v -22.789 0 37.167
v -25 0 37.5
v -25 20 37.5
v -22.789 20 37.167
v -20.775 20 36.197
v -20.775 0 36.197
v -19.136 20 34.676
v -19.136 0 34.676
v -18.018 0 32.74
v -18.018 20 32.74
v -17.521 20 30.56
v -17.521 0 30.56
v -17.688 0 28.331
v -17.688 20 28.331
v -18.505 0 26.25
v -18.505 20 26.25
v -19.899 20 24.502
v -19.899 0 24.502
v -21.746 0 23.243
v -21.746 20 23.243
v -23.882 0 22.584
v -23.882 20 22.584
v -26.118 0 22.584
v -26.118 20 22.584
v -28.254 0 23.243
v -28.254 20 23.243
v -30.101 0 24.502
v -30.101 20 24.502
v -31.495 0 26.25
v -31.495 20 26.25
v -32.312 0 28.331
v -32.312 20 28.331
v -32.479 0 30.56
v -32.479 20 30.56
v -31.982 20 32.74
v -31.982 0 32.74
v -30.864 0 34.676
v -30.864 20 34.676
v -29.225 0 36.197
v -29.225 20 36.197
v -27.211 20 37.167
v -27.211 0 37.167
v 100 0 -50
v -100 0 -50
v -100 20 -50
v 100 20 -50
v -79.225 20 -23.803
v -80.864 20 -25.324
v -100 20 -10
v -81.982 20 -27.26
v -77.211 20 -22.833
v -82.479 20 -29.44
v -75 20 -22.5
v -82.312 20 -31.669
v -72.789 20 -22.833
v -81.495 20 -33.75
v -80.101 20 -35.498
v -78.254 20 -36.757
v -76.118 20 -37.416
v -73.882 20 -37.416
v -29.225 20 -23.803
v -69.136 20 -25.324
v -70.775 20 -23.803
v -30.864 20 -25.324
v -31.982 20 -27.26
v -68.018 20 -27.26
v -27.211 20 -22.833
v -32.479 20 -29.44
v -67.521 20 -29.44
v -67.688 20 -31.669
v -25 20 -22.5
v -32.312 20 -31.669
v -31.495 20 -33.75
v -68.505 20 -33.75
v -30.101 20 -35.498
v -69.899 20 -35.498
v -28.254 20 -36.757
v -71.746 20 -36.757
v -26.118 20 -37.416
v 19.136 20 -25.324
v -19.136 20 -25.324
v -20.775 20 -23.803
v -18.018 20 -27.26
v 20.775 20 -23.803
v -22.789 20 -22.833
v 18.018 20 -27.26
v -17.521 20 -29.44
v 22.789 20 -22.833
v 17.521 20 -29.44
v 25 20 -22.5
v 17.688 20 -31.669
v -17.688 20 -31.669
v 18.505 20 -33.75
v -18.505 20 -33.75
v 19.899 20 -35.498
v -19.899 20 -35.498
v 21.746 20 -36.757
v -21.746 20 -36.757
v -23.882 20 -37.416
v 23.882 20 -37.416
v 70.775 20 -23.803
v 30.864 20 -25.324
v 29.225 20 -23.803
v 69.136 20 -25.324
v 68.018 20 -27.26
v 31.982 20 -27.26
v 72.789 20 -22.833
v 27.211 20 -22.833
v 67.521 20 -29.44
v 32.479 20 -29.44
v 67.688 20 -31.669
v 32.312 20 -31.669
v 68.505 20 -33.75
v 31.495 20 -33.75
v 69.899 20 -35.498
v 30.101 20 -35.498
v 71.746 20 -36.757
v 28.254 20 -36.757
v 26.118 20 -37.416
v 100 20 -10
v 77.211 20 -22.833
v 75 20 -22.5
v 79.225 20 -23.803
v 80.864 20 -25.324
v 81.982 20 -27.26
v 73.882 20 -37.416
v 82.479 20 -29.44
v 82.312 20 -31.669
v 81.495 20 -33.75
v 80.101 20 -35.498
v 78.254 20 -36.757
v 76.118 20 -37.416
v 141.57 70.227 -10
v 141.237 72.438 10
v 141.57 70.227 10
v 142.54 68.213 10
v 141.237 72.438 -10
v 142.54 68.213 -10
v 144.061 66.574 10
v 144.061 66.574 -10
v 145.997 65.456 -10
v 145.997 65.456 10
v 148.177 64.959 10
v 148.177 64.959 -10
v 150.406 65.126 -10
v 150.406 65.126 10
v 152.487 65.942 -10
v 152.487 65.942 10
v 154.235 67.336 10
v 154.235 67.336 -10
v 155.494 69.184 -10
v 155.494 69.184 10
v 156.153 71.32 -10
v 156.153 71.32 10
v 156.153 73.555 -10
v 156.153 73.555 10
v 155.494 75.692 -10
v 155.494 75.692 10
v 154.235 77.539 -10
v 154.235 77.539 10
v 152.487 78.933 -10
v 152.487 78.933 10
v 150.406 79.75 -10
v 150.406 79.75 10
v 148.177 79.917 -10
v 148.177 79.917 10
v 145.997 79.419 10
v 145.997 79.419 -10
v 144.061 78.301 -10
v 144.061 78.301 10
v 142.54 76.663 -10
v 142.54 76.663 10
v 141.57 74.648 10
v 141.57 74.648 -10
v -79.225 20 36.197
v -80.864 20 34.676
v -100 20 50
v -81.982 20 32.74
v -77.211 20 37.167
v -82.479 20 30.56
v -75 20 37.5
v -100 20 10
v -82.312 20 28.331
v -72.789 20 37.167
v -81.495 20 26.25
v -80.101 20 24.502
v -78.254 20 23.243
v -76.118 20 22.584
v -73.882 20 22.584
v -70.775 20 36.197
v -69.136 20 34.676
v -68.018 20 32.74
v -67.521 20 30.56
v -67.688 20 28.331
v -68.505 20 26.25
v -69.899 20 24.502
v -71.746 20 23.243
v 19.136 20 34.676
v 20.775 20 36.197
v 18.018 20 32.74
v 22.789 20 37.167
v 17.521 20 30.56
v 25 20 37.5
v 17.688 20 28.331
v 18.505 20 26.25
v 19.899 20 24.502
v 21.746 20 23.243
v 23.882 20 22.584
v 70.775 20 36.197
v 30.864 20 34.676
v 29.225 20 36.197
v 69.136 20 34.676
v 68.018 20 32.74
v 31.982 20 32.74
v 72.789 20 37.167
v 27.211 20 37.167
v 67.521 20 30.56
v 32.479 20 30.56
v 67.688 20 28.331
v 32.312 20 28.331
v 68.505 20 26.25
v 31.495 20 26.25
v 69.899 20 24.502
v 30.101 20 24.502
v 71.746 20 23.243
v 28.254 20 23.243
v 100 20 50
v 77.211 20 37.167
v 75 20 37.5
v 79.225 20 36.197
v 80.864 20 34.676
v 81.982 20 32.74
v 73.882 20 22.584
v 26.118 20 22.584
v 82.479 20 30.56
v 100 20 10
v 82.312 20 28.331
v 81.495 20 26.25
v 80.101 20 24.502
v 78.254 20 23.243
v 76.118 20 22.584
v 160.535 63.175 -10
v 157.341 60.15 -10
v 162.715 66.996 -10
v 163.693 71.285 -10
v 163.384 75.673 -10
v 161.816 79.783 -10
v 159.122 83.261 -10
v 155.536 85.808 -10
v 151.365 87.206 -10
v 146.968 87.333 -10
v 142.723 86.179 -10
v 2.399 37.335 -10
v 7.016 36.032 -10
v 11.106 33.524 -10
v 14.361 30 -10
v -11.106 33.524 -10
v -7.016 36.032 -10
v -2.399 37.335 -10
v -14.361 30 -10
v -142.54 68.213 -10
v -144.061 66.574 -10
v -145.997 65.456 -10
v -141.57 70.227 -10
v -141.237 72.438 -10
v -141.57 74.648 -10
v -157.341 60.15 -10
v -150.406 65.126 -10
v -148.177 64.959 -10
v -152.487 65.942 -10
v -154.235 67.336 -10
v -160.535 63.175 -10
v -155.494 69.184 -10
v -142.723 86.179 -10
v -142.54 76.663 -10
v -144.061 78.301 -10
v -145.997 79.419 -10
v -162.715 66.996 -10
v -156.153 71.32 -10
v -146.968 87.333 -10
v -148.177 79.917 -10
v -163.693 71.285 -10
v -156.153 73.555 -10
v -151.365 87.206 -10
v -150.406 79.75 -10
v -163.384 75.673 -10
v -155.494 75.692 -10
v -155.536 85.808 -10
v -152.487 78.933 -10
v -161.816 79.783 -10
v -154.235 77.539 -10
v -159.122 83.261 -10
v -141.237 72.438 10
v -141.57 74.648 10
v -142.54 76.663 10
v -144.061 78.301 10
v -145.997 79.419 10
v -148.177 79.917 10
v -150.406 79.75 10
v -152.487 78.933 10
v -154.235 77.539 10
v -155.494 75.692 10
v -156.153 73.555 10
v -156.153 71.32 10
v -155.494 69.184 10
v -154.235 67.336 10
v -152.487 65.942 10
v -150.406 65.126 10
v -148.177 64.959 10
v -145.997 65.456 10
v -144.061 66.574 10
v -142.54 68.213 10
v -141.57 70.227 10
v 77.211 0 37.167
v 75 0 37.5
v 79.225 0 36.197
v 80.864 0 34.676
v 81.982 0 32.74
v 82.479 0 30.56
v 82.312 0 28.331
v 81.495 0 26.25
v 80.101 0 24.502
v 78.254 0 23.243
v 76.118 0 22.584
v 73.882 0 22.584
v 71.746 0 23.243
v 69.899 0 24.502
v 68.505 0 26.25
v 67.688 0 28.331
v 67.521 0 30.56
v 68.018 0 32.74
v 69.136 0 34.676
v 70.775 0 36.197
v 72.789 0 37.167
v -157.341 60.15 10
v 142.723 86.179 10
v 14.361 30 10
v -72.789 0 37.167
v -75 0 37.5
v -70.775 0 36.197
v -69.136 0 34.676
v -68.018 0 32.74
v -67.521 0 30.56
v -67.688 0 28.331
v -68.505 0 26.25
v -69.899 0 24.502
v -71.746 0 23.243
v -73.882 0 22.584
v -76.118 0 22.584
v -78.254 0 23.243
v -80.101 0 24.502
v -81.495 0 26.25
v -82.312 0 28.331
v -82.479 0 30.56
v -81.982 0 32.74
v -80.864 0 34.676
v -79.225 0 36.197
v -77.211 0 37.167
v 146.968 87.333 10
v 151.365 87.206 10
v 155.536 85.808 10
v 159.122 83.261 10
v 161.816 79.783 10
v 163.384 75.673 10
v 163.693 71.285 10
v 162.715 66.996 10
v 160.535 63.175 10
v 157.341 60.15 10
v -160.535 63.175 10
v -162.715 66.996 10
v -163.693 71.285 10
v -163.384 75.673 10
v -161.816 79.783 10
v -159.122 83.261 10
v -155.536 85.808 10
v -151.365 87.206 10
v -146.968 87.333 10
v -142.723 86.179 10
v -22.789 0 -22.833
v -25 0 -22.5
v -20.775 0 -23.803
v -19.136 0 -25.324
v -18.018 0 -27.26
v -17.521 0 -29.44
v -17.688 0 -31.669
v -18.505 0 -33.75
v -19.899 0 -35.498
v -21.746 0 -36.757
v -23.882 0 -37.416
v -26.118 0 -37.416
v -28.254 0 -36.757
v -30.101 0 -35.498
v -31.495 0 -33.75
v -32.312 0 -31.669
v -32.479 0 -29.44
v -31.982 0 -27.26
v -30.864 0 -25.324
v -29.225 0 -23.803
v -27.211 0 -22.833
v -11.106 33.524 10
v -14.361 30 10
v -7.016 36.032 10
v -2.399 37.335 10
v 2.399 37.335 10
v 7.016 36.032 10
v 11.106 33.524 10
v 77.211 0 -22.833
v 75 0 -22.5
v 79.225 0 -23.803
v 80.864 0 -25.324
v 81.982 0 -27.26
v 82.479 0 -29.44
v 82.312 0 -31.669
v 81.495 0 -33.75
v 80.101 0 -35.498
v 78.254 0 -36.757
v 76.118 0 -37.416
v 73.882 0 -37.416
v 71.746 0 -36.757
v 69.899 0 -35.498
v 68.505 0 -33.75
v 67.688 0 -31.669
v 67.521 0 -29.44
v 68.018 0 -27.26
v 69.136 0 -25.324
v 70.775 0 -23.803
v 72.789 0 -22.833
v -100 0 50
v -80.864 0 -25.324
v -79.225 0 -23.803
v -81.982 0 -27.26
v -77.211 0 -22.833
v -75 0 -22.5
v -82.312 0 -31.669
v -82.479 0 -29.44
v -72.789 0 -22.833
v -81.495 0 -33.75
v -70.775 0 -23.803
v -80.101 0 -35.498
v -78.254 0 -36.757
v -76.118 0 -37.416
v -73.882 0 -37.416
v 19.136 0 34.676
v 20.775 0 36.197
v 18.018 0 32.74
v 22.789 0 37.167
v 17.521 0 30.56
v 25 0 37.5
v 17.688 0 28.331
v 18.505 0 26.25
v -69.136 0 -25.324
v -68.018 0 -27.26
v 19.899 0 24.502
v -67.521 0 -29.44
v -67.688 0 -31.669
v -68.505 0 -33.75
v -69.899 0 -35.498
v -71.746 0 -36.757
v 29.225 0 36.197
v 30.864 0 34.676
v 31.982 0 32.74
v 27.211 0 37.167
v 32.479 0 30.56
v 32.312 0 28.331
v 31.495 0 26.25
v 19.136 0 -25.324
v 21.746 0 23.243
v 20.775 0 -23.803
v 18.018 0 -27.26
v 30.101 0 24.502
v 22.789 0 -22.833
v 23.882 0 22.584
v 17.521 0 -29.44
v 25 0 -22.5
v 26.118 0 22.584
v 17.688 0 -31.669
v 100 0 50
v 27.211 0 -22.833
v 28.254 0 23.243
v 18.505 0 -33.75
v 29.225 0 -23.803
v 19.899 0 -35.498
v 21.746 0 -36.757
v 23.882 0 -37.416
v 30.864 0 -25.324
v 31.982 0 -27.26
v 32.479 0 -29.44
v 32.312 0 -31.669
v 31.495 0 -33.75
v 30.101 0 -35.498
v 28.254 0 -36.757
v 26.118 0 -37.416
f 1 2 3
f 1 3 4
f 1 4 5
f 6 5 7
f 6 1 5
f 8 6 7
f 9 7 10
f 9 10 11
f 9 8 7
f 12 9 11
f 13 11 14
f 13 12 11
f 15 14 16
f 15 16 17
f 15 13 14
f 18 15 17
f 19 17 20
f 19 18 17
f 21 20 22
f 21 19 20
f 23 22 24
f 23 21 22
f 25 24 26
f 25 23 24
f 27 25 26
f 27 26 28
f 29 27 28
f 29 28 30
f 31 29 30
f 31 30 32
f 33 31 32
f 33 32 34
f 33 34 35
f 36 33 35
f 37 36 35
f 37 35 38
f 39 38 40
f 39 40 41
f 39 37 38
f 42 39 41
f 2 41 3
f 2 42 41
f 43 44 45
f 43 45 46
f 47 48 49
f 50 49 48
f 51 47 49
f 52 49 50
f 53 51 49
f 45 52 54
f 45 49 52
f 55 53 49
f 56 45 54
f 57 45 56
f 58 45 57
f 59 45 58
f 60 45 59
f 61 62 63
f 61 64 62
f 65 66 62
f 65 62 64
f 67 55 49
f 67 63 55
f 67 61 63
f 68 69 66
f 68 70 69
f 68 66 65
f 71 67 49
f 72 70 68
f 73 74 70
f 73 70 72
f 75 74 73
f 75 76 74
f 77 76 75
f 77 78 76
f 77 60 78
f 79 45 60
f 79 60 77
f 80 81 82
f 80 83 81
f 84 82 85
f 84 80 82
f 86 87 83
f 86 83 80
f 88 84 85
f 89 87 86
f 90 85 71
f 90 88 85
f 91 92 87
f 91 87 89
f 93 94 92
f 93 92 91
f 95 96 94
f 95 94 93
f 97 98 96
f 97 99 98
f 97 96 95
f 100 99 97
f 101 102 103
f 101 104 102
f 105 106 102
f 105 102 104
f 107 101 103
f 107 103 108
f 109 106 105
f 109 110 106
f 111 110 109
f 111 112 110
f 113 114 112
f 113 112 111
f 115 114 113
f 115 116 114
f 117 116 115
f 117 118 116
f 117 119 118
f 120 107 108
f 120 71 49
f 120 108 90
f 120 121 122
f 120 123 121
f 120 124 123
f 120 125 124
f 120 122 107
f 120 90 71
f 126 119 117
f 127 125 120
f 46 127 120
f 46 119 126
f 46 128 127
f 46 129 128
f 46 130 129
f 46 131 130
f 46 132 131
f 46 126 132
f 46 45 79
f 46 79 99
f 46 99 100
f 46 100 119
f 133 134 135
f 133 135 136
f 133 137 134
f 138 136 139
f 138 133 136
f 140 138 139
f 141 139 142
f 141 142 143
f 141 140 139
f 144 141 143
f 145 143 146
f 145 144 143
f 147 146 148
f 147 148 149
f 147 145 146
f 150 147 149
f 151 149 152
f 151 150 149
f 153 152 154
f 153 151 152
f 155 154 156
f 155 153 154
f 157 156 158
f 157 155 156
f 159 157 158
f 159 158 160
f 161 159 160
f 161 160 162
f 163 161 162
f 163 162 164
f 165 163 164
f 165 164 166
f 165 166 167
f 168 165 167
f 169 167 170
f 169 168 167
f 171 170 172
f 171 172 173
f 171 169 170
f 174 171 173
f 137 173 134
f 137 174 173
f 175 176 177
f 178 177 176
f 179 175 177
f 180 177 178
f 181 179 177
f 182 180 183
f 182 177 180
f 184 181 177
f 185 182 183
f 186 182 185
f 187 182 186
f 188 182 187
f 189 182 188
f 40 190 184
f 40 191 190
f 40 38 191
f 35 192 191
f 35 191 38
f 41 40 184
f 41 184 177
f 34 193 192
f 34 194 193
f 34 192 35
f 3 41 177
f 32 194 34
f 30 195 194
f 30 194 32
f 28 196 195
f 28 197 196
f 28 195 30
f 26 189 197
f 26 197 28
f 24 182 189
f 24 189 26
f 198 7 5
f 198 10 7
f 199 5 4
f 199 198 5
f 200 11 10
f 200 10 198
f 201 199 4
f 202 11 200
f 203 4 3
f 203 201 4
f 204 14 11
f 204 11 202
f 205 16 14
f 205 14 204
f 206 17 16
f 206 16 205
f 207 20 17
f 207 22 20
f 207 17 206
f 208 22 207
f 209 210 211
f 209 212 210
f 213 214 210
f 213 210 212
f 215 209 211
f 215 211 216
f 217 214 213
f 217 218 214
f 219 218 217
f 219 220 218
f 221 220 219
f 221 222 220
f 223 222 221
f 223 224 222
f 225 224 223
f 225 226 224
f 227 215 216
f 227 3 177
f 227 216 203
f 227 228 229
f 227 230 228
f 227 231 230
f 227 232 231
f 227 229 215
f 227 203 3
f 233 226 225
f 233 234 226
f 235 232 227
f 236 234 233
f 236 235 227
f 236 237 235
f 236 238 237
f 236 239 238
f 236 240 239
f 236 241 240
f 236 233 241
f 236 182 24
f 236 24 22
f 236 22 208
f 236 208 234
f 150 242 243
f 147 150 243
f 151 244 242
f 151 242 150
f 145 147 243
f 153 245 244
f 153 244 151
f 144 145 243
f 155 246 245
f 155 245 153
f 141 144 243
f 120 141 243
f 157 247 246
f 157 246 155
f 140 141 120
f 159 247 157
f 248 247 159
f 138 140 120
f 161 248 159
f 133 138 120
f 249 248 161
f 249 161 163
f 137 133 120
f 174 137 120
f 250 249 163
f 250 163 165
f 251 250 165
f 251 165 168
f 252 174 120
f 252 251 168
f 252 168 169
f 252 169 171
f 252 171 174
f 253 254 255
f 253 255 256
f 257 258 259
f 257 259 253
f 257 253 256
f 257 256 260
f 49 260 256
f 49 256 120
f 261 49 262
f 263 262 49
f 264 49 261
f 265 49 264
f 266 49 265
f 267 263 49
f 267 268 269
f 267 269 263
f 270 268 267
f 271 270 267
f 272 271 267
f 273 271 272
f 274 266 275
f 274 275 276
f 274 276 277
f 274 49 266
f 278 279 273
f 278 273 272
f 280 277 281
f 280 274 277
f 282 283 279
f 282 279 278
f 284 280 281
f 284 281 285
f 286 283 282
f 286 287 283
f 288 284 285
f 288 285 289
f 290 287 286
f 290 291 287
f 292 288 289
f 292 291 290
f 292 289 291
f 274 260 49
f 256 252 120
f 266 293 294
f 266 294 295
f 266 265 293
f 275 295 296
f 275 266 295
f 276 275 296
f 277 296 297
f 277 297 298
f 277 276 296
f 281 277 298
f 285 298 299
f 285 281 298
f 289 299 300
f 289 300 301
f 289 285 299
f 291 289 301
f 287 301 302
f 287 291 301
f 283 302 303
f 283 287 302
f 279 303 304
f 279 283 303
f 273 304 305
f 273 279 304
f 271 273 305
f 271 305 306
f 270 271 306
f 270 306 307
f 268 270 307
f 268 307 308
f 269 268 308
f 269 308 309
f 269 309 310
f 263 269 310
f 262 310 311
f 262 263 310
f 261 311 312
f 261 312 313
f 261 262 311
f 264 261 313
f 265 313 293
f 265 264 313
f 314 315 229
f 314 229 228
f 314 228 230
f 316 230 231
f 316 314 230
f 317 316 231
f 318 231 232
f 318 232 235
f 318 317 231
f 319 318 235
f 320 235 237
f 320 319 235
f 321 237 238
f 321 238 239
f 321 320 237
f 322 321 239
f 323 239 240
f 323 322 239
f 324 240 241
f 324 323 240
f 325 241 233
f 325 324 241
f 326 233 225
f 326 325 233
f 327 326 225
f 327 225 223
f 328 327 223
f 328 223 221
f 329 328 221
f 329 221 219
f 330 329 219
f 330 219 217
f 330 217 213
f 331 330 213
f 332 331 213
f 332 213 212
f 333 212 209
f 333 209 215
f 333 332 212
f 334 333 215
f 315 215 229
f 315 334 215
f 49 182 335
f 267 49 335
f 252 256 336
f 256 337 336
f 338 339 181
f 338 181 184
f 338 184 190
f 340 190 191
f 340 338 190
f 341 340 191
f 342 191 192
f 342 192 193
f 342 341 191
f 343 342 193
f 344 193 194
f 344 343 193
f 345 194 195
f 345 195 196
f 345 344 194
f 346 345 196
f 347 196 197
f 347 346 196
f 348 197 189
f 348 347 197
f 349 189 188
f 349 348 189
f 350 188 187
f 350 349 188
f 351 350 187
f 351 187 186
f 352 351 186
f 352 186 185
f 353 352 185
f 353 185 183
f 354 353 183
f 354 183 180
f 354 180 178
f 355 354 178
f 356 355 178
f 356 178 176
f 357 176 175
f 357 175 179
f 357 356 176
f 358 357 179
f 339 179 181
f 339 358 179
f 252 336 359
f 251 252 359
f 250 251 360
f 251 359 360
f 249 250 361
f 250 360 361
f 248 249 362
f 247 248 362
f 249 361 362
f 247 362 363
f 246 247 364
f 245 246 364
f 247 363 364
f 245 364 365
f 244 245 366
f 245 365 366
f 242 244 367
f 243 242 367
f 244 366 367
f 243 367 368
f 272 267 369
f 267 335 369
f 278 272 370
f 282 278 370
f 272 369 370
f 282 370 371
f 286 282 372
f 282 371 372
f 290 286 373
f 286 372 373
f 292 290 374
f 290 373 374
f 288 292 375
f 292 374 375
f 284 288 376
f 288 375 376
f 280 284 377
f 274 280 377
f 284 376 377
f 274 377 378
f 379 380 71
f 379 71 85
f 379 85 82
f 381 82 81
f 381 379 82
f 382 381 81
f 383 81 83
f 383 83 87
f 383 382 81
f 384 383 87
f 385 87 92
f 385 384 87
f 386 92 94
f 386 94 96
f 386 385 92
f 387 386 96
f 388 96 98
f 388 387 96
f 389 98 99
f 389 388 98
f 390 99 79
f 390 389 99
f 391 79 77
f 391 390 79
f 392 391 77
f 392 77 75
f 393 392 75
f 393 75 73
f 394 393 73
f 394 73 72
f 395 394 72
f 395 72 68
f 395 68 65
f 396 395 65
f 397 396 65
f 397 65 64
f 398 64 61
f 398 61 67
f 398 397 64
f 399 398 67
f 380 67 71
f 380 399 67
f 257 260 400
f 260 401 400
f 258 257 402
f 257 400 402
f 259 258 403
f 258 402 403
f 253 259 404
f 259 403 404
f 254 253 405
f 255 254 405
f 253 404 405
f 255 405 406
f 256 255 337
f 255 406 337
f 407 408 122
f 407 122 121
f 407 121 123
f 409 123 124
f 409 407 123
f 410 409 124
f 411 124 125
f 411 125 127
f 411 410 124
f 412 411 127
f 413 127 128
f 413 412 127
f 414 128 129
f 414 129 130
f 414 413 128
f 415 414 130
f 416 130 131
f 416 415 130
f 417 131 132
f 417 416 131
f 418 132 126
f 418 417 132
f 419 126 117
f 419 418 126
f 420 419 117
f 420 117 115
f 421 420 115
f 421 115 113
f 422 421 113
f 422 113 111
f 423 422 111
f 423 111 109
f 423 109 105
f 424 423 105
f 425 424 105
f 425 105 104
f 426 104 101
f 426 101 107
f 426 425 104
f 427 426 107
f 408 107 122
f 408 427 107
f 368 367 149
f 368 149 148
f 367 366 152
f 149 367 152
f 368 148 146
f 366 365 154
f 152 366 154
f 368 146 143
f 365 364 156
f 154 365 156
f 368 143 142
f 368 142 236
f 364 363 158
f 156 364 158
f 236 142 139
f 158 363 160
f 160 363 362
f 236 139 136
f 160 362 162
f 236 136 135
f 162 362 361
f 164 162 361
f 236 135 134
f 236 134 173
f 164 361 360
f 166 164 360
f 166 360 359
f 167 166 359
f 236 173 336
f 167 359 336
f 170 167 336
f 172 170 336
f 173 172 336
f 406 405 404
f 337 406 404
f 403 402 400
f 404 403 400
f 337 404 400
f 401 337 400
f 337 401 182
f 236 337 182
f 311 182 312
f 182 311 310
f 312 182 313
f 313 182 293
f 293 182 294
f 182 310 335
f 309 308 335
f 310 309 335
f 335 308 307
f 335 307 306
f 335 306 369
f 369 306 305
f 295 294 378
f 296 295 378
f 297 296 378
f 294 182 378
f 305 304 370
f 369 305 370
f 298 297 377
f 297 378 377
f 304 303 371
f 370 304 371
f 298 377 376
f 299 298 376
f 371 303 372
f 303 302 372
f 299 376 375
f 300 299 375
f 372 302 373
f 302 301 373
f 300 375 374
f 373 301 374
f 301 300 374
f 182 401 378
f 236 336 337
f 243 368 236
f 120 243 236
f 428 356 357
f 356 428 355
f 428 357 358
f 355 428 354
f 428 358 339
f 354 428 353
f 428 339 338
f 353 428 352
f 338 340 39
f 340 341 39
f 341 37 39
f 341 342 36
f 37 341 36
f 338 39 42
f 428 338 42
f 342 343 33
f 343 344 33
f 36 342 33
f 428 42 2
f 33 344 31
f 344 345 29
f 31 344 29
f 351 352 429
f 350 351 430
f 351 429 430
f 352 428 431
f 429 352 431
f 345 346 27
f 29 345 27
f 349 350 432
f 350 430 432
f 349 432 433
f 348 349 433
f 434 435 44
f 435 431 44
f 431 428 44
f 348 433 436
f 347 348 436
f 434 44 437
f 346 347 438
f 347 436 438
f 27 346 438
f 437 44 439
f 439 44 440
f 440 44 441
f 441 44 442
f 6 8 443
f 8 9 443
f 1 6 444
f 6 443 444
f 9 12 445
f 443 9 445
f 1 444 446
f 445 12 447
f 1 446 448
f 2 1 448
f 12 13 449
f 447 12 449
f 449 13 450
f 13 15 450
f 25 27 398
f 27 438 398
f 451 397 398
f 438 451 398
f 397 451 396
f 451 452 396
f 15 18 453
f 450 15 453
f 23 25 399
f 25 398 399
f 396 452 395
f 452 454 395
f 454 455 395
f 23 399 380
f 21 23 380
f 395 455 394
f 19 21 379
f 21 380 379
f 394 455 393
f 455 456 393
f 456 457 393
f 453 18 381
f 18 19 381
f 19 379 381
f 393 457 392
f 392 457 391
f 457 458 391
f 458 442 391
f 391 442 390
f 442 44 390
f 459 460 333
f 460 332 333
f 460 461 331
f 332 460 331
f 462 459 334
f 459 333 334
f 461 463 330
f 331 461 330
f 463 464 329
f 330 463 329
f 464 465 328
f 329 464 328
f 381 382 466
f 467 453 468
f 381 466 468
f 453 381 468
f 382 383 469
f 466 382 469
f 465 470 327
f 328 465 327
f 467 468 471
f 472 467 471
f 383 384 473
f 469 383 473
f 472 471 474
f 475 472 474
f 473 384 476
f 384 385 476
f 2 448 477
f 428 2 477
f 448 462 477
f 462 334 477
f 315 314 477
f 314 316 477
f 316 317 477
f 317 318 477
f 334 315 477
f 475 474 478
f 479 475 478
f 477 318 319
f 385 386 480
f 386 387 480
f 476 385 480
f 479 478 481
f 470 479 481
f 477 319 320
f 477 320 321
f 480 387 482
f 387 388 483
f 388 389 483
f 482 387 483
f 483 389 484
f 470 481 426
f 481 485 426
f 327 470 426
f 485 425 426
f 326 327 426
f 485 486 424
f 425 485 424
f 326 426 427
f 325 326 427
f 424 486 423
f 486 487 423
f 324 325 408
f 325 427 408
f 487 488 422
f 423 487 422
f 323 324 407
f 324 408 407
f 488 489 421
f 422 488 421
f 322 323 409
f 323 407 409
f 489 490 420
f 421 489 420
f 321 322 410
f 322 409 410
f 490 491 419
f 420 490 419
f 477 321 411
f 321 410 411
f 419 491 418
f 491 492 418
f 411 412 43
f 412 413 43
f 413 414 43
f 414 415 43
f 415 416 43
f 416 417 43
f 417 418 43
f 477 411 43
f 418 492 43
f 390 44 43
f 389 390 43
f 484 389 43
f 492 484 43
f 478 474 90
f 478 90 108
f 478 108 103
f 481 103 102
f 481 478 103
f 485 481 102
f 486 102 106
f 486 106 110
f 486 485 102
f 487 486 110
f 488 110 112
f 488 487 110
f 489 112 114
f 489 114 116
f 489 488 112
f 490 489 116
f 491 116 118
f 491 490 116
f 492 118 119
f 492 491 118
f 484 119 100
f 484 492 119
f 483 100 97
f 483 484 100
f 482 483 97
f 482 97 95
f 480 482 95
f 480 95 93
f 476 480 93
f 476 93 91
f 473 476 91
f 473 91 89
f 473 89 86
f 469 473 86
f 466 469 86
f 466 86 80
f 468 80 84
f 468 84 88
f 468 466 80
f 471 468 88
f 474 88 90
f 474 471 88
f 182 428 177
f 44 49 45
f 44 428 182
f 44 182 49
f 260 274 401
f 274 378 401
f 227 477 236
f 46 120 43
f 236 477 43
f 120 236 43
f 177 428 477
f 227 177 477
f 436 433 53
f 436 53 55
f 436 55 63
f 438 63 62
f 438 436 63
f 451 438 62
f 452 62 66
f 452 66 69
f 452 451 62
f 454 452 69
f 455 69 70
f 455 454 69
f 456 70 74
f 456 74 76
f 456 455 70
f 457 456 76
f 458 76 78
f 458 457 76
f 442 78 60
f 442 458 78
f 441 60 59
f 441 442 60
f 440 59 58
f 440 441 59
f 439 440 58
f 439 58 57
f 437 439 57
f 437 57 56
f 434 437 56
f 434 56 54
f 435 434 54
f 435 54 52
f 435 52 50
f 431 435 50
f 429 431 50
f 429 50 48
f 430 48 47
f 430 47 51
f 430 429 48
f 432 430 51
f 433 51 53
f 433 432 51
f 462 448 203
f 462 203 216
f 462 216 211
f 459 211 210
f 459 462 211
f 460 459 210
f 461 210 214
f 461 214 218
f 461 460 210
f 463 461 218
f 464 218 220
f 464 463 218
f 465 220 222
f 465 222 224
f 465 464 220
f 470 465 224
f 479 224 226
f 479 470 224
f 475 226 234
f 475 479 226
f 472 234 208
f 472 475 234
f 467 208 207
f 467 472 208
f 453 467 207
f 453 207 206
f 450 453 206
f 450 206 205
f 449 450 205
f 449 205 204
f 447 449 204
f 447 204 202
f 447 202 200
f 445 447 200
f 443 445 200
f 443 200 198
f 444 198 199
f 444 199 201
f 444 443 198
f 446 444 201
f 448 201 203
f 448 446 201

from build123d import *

# Parameters (mm, degrees)
SKETCH1_W           = 200
SKETCH1_H           = 100
SKETCH1_R           = 7.5
BOSS_EXTRUDE1_DEPTH = 20
SKETCH2_R           = 7.5
BOSS_EXTRUDE2_DEPTH = 10


with BuildPart() as part:
    # Sketch1 → Boss-Extrude1 (new body)
    with BuildSketch(Plane(origin=(0, 0, 0), x_dir=(1, 0, 0), z_dir=(0, 1, 0))):
        Rectangle(SKETCH1_W, SKETCH1_H)
        with Locations(Location((-75, 30, 0), (0, 0, 270))):
            Circle(SKETCH1_R, mode=Mode.SUBTRACT)
        with Locations(Location((-75, -30, 0), (0, 0, 270))):
            Circle(SKETCH1_R, mode=Mode.SUBTRACT)
        with Locations(Location((-25, 30, 0), (0, 0, 270))):
            Circle(SKETCH1_R, mode=Mode.SUBTRACT)
        with Locations(Location((-25, -30, 0), (0, 0, 270))):
            Circle(SKETCH1_R, mode=Mode.SUBTRACT)
        with Locations(Location((25, 30, 0), (0, 0, 270))):
            Circle(SKETCH1_R, mode=Mode.SUBTRACT)
        with Locations(Location((25, -30, 0), (0, 0, 270))):
            Circle(SKETCH1_R, mode=Mode.SUBTRACT)
        with Locations(Location((75, 30, 0), (0, 0, 270))):
            Circle(SKETCH1_R, mode=Mode.SUBTRACT)
        with Locations(Location((75, -30, 0), (0, 0, 270))):
            Circle(SKETCH1_R, mode=Mode.SUBTRACT)
    extrude(amount=BOSS_EXTRUDE1_DEPTH)

    # Sketch2 → Boss-Extrude2 (add, symmetric)
    with BuildSketch(Plane.XY):
        with BuildLine():
            Line((-100, 20), (-157.3406431, 60.150350545))
            ThreePointArc((-157.3406431, 60.150350545), (-161.81564798, 79.782621127), (-142.722823192, 86.17916383))
            Line((-142.722823192, 86.17916383), (-14.361406616, 30))
            ThreePointArc((-14.361406616, 30), (0, 37.5), (14.361406616, 30))
            Line((14.361406616, 30), (142.722823192, 86.17916383))
            ThreePointArc((142.722823192, 86.17916383), (161.81564798, 79.782621127), (157.3406431, 60.150350545))
            Line((157.3406431, 60.150350545), (100, 20))
            Line((100, 20), (-100, 20))
        make_face()
        with Locations((-148.736996555, 72.437631209)):
            Circle(SKETCH2_R, mode=Mode.SUBTRACT)
        with Locations(Location((148.736996555, 72.437631209, 0), (0, 0, 180))):
            Circle(SKETCH2_R, mode=Mode.SUBTRACT)
    extrude(amount=BOSS_EXTRUDE2_DEPTH, both=True)


solid = part.part
